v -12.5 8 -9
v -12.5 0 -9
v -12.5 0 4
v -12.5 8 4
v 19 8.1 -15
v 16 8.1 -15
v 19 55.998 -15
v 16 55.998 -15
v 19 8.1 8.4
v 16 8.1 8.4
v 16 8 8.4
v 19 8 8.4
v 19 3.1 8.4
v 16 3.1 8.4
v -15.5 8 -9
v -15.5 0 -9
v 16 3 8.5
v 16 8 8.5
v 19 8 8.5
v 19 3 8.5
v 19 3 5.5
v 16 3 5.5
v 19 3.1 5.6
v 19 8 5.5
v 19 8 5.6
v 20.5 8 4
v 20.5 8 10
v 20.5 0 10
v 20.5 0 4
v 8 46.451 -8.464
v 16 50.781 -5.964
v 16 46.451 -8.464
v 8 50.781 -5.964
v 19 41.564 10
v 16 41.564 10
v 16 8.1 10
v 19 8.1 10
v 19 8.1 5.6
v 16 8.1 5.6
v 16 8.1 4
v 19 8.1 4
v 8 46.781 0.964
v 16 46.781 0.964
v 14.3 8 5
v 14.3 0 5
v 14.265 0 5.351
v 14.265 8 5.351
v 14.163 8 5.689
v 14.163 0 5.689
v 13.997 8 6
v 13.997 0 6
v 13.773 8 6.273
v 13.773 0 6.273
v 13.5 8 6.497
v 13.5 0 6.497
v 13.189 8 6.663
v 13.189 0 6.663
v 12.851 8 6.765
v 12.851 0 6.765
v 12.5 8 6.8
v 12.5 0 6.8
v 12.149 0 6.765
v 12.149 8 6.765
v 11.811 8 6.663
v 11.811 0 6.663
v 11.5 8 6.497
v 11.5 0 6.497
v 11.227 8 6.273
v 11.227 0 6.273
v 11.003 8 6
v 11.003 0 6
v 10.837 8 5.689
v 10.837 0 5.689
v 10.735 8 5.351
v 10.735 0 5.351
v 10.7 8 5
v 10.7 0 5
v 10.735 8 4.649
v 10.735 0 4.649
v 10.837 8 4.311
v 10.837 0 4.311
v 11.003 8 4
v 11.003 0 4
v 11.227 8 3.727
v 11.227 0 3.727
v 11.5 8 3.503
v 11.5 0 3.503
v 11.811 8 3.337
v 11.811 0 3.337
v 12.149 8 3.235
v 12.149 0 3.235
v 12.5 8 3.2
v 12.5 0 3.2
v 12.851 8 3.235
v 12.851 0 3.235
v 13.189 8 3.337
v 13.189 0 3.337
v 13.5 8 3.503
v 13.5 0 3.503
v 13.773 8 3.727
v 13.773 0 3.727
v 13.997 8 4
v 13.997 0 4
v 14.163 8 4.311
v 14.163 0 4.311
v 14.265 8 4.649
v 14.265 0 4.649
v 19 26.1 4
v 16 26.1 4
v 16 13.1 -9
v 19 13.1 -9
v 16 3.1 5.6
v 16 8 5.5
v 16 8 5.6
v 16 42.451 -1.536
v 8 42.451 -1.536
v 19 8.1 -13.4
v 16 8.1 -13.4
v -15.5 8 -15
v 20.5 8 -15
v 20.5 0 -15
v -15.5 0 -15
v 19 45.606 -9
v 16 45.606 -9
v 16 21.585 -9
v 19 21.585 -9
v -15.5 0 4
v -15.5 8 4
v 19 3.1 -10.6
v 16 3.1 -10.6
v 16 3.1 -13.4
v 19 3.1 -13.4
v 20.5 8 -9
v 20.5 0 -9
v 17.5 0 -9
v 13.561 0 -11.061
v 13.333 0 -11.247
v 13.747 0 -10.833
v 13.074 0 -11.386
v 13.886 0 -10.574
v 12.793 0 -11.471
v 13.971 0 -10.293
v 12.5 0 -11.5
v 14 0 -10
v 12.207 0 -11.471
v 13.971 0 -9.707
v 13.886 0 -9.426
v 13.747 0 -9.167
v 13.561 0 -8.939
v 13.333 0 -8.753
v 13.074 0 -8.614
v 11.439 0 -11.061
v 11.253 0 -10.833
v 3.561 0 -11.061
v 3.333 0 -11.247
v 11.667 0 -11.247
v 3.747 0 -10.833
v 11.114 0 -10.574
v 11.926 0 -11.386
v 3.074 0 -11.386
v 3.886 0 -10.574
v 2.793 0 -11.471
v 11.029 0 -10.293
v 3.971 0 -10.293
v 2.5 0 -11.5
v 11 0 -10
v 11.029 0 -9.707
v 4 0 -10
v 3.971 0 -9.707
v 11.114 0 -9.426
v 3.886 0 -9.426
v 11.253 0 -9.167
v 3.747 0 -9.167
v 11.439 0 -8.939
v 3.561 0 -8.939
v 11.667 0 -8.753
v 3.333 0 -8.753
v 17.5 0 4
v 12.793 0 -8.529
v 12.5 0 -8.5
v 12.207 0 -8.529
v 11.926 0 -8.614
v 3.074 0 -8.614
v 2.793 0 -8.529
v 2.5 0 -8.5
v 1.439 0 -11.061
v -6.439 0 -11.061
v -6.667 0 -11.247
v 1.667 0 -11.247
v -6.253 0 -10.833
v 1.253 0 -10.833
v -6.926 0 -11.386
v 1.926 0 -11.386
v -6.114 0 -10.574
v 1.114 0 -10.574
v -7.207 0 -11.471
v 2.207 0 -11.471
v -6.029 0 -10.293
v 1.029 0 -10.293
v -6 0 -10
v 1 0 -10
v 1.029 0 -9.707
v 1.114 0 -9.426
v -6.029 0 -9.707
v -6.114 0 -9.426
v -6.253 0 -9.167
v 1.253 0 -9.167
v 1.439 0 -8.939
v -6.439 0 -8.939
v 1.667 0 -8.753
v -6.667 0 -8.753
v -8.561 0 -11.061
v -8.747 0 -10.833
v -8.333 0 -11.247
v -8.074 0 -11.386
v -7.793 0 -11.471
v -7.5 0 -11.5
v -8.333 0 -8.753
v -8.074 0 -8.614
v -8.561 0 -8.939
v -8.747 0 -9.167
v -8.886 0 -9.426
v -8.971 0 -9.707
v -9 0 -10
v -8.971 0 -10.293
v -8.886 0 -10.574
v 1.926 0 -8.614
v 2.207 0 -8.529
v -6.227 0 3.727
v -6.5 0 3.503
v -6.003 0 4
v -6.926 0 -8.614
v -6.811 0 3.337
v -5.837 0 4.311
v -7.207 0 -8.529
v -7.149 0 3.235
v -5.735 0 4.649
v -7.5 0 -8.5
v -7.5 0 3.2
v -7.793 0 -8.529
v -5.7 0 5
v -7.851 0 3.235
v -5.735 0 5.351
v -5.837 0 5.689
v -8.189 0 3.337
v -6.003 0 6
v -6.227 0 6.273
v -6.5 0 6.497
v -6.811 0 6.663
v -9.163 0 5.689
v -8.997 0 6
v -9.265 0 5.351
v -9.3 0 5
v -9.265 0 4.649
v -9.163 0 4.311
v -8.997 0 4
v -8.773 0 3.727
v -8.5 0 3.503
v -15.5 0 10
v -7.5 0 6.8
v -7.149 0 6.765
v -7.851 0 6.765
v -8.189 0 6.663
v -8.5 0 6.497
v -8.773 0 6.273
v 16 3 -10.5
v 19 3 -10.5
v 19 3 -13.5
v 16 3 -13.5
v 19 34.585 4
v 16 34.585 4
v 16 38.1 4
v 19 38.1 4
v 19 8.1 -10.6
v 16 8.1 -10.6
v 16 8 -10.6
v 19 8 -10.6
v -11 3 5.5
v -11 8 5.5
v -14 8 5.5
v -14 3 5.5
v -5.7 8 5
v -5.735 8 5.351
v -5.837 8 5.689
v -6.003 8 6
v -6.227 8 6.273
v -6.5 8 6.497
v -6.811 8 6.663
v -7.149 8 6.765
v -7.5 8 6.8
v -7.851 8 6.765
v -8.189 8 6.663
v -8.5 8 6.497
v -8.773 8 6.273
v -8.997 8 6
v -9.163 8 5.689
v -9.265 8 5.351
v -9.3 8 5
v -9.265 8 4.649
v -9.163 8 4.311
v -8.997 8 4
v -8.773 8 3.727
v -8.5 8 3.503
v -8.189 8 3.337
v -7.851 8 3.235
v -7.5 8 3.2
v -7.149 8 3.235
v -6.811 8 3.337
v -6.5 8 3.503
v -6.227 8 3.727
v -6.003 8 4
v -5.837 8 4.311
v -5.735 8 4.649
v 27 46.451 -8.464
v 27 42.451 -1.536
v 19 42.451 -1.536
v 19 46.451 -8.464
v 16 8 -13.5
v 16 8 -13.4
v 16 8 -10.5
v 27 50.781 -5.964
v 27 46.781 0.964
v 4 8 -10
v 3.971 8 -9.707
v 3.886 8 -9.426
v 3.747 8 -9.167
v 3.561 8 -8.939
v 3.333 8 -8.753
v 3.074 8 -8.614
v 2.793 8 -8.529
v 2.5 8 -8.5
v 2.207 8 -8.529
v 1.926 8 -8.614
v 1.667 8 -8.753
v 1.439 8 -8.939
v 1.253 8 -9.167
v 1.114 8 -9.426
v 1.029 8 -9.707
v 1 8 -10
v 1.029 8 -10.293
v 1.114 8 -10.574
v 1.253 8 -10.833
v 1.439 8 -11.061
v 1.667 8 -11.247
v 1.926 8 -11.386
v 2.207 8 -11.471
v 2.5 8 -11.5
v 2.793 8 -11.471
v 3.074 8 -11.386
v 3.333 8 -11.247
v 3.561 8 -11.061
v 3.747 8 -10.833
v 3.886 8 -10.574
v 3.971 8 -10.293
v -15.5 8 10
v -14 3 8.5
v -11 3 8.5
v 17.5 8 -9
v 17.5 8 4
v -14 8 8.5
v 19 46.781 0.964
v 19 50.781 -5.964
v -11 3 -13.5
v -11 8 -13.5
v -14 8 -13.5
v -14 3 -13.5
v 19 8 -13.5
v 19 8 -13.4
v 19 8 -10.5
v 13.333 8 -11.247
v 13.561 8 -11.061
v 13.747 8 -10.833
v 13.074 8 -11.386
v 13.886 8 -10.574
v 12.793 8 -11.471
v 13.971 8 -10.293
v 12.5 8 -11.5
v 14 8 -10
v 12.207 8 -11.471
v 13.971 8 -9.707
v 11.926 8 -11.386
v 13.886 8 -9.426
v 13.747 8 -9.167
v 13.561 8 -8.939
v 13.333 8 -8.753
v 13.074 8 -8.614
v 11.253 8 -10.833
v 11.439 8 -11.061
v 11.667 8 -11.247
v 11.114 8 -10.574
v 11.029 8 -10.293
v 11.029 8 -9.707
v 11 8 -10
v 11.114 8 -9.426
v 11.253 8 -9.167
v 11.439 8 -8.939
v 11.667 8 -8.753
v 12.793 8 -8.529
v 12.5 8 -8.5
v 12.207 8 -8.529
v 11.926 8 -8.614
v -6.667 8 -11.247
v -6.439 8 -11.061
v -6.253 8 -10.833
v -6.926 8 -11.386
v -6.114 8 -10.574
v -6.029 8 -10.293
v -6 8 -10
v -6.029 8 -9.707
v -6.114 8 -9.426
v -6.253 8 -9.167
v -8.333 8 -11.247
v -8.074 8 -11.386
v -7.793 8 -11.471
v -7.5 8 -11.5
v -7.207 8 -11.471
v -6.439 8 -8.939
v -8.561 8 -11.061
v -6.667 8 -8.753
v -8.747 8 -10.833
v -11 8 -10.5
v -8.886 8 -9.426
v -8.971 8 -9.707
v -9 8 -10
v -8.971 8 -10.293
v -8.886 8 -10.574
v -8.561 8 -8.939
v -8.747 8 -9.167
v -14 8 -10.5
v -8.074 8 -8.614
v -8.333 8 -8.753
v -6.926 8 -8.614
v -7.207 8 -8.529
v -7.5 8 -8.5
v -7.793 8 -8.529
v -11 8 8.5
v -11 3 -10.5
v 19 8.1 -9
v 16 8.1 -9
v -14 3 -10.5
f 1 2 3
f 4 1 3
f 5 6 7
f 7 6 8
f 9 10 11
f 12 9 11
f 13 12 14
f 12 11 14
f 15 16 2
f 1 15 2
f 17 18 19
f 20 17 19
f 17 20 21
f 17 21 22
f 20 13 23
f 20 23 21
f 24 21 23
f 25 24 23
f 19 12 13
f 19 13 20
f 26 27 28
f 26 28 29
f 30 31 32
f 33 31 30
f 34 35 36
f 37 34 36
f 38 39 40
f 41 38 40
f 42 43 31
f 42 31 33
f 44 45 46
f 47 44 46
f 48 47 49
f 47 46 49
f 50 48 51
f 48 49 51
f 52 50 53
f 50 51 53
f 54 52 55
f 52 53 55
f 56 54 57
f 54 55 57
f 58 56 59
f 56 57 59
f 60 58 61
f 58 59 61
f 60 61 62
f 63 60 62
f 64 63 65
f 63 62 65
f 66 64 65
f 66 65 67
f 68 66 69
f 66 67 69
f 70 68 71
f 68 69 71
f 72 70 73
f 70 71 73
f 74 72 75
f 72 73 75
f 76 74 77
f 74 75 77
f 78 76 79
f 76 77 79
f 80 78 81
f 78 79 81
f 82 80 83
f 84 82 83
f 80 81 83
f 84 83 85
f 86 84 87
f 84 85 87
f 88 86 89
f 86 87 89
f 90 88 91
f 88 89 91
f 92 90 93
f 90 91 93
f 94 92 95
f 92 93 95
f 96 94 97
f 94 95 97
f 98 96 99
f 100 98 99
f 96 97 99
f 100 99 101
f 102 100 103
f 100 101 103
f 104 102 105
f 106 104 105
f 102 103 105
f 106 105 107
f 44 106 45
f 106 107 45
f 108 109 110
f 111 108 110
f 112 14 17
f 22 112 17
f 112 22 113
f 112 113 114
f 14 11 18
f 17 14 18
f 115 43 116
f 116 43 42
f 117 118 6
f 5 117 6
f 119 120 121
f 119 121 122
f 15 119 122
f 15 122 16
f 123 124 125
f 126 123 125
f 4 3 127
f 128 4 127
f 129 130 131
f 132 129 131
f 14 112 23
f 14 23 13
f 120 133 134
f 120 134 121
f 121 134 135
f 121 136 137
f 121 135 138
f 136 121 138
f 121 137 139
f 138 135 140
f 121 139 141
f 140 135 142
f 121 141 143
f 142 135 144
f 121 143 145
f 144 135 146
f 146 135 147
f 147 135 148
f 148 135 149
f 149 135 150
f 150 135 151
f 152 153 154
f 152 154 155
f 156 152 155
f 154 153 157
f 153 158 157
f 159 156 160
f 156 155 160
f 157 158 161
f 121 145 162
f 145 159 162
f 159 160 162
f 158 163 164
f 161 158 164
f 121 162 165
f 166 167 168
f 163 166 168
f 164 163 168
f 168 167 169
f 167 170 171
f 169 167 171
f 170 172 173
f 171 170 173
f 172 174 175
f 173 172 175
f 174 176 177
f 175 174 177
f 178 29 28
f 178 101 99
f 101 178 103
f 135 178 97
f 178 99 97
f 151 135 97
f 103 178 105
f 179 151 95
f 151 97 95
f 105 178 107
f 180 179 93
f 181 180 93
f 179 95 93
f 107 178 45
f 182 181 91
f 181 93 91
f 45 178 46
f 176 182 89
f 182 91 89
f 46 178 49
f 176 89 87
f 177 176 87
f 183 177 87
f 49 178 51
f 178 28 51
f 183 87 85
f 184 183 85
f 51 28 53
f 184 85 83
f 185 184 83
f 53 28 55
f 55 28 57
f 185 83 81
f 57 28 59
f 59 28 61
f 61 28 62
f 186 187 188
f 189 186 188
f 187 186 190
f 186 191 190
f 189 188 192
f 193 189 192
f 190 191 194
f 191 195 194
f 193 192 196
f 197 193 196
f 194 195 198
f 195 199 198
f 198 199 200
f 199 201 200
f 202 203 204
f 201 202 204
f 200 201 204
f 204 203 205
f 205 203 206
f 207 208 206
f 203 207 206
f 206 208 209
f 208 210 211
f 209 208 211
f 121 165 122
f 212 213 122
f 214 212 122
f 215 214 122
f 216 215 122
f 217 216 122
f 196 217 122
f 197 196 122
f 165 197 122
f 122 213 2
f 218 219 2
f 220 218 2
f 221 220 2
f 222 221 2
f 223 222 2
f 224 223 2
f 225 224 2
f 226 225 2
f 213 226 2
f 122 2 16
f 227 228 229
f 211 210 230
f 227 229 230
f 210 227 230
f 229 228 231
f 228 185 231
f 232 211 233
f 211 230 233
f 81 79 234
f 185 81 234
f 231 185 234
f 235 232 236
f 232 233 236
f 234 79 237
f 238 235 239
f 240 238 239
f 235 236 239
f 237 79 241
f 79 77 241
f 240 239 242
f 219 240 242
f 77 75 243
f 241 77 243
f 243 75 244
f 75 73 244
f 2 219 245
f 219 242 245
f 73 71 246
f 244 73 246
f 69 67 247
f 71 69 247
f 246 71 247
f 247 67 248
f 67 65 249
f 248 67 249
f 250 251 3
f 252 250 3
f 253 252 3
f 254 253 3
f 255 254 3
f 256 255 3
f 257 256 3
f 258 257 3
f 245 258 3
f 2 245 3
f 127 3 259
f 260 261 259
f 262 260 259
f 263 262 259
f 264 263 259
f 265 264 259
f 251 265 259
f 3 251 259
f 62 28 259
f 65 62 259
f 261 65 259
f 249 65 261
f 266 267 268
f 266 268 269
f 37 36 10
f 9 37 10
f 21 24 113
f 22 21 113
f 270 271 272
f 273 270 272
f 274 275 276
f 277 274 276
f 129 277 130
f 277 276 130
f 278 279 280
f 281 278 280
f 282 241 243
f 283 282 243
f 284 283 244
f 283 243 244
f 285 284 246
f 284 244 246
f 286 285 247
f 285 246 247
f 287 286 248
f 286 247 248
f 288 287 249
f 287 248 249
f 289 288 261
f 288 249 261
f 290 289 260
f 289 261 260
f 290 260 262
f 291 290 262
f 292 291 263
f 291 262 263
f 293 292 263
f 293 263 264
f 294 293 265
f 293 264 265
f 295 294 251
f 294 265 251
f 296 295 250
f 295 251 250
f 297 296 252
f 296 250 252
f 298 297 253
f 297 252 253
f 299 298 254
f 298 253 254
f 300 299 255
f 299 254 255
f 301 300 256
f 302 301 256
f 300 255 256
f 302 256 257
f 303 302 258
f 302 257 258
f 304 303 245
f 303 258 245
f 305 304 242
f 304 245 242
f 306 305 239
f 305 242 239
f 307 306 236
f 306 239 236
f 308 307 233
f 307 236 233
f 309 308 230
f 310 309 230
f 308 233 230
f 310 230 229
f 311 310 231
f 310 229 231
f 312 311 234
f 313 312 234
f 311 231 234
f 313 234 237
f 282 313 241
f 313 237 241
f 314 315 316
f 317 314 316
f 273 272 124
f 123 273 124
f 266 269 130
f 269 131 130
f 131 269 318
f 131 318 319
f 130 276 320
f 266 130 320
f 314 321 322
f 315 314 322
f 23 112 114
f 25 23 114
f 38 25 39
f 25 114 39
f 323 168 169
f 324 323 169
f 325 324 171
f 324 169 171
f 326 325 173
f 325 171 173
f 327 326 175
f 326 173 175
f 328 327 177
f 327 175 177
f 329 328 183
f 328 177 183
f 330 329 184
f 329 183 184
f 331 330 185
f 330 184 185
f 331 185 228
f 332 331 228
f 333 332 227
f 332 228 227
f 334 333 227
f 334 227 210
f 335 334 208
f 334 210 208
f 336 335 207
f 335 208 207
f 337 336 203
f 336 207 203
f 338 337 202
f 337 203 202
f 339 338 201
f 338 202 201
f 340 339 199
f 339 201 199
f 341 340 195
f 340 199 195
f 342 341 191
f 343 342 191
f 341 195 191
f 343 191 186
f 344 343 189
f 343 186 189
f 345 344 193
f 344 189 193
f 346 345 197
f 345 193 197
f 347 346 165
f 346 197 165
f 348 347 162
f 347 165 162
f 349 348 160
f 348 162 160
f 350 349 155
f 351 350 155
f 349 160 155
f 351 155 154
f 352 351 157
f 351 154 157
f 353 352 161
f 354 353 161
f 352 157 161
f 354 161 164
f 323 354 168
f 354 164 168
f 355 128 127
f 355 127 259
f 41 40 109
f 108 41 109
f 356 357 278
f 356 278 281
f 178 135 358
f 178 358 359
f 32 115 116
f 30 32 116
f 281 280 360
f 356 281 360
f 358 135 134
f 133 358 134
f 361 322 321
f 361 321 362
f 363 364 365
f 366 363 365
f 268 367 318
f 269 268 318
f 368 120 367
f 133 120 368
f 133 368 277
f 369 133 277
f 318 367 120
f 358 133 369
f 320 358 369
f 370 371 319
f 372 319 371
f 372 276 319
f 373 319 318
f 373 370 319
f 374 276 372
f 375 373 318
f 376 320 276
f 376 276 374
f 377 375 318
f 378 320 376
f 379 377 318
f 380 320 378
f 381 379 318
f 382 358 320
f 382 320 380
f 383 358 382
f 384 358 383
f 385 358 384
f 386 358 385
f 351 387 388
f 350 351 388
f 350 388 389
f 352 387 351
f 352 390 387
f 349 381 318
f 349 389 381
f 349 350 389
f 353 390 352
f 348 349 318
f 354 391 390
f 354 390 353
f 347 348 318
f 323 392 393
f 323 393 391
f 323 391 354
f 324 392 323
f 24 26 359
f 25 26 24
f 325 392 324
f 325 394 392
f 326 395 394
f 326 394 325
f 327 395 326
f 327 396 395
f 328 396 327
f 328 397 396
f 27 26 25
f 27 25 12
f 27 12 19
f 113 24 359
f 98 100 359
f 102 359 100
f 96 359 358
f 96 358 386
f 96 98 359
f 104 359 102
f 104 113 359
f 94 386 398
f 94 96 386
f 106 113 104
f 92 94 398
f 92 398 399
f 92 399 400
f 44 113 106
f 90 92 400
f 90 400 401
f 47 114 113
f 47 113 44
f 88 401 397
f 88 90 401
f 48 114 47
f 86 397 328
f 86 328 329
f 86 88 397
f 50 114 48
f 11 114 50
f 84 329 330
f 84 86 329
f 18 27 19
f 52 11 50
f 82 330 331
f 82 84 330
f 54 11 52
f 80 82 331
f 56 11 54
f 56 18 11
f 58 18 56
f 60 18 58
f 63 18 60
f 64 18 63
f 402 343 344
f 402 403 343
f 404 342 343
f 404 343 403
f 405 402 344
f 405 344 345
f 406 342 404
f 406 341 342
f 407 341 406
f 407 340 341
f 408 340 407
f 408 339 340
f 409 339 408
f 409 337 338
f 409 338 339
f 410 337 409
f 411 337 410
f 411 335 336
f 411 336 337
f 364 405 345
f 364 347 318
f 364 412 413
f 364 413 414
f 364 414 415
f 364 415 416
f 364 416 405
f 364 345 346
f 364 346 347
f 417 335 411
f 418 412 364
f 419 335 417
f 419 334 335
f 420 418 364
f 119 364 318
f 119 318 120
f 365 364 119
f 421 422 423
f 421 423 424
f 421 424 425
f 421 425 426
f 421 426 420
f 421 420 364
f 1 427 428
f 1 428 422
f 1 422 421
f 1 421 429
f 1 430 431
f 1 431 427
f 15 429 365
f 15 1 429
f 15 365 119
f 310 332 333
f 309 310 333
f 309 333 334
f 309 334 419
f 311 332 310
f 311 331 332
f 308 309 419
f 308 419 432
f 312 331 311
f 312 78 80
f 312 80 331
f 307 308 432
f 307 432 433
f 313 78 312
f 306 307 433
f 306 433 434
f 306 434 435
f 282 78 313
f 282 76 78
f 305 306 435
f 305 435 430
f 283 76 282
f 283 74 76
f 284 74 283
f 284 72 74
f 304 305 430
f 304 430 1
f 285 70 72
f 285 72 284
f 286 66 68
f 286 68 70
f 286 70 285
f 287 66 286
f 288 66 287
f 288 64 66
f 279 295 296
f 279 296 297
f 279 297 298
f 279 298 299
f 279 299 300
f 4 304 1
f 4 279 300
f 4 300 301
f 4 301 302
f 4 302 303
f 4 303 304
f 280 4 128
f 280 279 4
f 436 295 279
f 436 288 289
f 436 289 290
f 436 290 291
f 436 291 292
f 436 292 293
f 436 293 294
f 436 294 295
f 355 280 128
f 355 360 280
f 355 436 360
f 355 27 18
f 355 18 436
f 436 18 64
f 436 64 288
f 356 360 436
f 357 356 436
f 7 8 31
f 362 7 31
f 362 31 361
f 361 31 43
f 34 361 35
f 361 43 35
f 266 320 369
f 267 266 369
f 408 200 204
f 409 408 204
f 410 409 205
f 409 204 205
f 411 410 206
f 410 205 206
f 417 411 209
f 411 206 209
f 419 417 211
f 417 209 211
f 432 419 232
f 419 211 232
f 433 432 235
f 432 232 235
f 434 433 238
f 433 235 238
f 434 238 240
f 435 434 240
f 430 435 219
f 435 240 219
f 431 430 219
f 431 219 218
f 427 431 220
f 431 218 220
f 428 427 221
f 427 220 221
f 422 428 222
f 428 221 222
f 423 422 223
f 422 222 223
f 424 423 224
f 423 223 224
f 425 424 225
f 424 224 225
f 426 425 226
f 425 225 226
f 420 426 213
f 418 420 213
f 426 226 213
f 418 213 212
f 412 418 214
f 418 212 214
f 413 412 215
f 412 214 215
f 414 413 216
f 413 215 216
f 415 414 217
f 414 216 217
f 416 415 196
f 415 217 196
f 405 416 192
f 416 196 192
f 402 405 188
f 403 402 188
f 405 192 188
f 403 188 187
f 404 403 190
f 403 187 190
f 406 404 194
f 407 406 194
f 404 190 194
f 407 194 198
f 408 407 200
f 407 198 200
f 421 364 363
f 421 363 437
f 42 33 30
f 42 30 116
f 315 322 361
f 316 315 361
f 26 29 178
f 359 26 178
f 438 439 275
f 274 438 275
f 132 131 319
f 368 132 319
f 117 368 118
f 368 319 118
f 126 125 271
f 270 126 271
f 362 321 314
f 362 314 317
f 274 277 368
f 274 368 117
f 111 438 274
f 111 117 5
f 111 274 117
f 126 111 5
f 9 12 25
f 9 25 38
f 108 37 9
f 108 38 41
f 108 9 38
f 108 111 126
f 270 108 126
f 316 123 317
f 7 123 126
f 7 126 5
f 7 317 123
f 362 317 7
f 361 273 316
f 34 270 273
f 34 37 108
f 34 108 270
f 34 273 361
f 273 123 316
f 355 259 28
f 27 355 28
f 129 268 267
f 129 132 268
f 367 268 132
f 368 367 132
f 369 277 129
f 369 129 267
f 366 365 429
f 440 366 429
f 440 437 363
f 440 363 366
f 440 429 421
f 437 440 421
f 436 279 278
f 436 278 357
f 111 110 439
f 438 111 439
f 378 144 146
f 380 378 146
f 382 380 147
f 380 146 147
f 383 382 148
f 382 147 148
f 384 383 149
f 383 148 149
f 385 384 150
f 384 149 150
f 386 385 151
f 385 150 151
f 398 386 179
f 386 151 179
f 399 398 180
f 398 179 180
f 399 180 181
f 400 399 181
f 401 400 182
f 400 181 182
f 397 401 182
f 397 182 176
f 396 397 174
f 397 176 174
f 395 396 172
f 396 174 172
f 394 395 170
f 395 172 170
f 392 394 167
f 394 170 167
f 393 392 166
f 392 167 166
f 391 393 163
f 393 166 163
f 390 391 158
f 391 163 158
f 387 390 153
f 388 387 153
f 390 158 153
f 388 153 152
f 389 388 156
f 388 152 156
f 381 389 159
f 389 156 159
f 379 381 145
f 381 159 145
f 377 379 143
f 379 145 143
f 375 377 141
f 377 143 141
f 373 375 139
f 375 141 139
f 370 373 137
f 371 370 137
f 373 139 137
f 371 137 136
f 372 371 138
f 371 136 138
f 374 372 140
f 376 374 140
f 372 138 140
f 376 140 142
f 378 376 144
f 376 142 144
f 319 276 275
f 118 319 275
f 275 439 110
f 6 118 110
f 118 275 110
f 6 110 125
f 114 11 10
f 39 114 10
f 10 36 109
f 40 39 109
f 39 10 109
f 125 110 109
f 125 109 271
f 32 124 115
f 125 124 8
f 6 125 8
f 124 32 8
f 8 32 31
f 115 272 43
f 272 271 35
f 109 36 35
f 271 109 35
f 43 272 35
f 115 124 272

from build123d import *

# Parameters (mm, degrees)
F0_W     = 30
F0_H     = 25
F0_R     = 1.5
F0_R_2   = 1.8
F1_DEPTH = 8
F2_W     = 1.5
F2_H     = 3
F3_DEPTH = 8
F4_DEPTH = 5
F5_W     = 4.9
F5_H     = 2.8
F6_DEPTH = 3
F7_W     = 8
F7_H     = 8
F8_DEPTH = 5


with BuildPart() as f1:
    # F0 (on Front) → F1 (new body)
    with BuildSketch(Plane.XZ):
        with Locations((2.5, -2.5)):
            Rectangle(F0_W, F0_H)
        with Locations((-7.5, -10)):
            Circle(F0_R, mode=Mode.SUBTRACT)
        with Locations((2.5, -10)):
            Circle(F0_R, mode=Mode.SUBTRACT)
        with Locations((12.5, -10)):
            Circle(F0_R, mode=Mode.SUBTRACT)
        with Locations((-7.5, 5)):
            Circle(F0_R_2, mode=Mode.SUBTRACT)
        with Locations((12.5, 5)):
            Circle(F0_R_2, mode=Mode.SUBTRACT)
    extrude(amount=-F1_DEPTH)

    # F2 (on face) → F3 (join)
    with BuildSketch(Plane(origin=(0, 8, 0), x_dir=(-1, 0, 0), z_dir=(0, 1, 0))):
        Polygon((-17.5, -9), (-20.5, -9), (-20.5, -15), (-17.5, -15), (-17.5, -13.5), (-19, -13.5), (-19, -10.5), (-17.5, -10.5), align=None)
        Polygon((-17.5, 8.5), (-17.5, 10), (-20.5, 10), (-20.5, 4), (-17.5, 4), (-17.5, 5.5), (-19, 5.5), (-19, 8.5), align=None)
        Polygon((15.5, 10), (12.5, 10), (12.5, 8.5), (14, 8.5), (14, 5.5), (12.5, 5.5), (12.5, 4), (15.5, 4), align=None)
        Polygon((15.5, -15), (15.5, -9), (12.5, -9), (12.5, -10.5), (14, -10.5), (14, -13.5), (12.5, -13.5), (12.5, -15), align=None)
        with Locations((-18.25, 7)):
            Rectangle(F2_W, F2_H)
        with Locations((-18.25, -12)):
            Rectangle(F2_W, F2_H)
        with Locations((13.25, -12)):
            Rectangle(F2_W, F2_H)
        with Locations((13.25, 7)):
            Rectangle(F2_W, F2_H)
    extrude(amount=-F3_DEPTH)

    # F2 (on face) → F4 (cut)
    with BuildSketch(Plane(origin=(0, 8, 0), x_dir=(-1, 0, 0), z_dir=(0, 1, 0))):
        with Locations((-16.75, 7)):
            Rectangle(F2_W, F2_H)
        with Locations((-18.25, 7)):
            Rectangle(F2_W, F2_H)
        with Locations((-16.75, -12)):
            Rectangle(F2_W, F2_H)
        with Locations((-18.25, -12)):
            Rectangle(F2_W, F2_H)
        with Locations((13.25, -12)):
            Rectangle(F2_W, F2_H)
        with Locations((11.75, -12)):
            Rectangle(F2_W, F2_H)
        with Locations((13.25, 7)):
            Rectangle(F2_W, F2_H)
        with Locations((11.75, 7)):
            Rectangle(F2_W, F2_H)
    extrude(amount=-F4_DEPTH, mode=Mode.SUBTRACT)

    # F5 (on face) → F6 (join)
    with BuildSketch(Plane.YZ.offset(16)):
        Polygon((8.1, 8.4), (8, 8.4), (8, 5.6), (8.1, 5.6), (8.1, 4), (26.1, 4), (13.1, -9), (8.1, -9), (8.1, -10.6), (8, -10.6), (3.1, -10.6), (3.1, -13.4), (8, -13.4), (8.1, -13.4), (8.1, -13.5), (8.1, -15), (13.1, -15), (49.069655, -15), (55.997858, -15), (41.564102, 10), (38.1, 10), (8.1, 10), align=None)
        Polygon((34.585282, 4), (38.1, 4), (45.605553, -9), (21.585282, -9), align=None, mode=Mode.SUBTRACT)
        with Locations((5.55, 7)):
            Rectangle(F5_W, F5_H)
    extrude(amount=F6_DEPTH)

    # F7 (on face) → F8 (join)
    with BuildSketch(Plane(origin=(0, 35.503203, 20.497784), x_dir=(-1, 0, 0), z_dir=(0, 0.866025, 0.5))):
        with Locations((-23, -26.555553)):
            Rectangle(F7_W, F7_H)
        with Locations((-12, -26.555553)):
            Rectangle(F7_W, F7_H)
    extrude(amount=-F8_DEPTH)


solid = f1.part
